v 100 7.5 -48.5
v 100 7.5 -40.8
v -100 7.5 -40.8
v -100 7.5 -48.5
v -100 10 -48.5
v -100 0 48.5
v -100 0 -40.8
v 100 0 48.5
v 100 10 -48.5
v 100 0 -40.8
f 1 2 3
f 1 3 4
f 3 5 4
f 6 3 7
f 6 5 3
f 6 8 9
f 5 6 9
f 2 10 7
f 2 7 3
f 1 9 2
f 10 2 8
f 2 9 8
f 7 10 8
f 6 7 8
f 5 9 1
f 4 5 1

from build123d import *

# Parameters (mm, degrees)
BOSS_EXTRUDE1_DEPTH = 100
SKETCH3_W           = 7.7
SKETCH3_H           = 7.5
CUT_EXTRUDE1_DEPTH  = 207.039437972


with BuildPart() as part:
    # Sketch1 → Boss-Extrude1 (new, symmetric)
    with BuildSketch(Plane(origin=(0, 0, 0), x_dir=(0, 0, -1), z_dir=(1, 0, 0))):
        Polygon((-48.5, 0), (48.5, 10), (48.5, 0), align=None)
    extrude(amount=BOSS_EXTRUDE1_DEPTH, both=True)

    # Sketch3 → Cut-Extrude1 (cut, through all)
    with BuildSketch(Plane(origin=(100, 0, 0), x_dir=(0, 0, -1), z_dir=(1, 0, 0))):
        with Locations((44.65, 3.75)):
            Rectangle(SKETCH3_W, SKETCH3_H)
    extrude(amount=-CUT_EXTRUDE1_DEPTH, mode=Mode.SUBTRACT)


solid = part.part
